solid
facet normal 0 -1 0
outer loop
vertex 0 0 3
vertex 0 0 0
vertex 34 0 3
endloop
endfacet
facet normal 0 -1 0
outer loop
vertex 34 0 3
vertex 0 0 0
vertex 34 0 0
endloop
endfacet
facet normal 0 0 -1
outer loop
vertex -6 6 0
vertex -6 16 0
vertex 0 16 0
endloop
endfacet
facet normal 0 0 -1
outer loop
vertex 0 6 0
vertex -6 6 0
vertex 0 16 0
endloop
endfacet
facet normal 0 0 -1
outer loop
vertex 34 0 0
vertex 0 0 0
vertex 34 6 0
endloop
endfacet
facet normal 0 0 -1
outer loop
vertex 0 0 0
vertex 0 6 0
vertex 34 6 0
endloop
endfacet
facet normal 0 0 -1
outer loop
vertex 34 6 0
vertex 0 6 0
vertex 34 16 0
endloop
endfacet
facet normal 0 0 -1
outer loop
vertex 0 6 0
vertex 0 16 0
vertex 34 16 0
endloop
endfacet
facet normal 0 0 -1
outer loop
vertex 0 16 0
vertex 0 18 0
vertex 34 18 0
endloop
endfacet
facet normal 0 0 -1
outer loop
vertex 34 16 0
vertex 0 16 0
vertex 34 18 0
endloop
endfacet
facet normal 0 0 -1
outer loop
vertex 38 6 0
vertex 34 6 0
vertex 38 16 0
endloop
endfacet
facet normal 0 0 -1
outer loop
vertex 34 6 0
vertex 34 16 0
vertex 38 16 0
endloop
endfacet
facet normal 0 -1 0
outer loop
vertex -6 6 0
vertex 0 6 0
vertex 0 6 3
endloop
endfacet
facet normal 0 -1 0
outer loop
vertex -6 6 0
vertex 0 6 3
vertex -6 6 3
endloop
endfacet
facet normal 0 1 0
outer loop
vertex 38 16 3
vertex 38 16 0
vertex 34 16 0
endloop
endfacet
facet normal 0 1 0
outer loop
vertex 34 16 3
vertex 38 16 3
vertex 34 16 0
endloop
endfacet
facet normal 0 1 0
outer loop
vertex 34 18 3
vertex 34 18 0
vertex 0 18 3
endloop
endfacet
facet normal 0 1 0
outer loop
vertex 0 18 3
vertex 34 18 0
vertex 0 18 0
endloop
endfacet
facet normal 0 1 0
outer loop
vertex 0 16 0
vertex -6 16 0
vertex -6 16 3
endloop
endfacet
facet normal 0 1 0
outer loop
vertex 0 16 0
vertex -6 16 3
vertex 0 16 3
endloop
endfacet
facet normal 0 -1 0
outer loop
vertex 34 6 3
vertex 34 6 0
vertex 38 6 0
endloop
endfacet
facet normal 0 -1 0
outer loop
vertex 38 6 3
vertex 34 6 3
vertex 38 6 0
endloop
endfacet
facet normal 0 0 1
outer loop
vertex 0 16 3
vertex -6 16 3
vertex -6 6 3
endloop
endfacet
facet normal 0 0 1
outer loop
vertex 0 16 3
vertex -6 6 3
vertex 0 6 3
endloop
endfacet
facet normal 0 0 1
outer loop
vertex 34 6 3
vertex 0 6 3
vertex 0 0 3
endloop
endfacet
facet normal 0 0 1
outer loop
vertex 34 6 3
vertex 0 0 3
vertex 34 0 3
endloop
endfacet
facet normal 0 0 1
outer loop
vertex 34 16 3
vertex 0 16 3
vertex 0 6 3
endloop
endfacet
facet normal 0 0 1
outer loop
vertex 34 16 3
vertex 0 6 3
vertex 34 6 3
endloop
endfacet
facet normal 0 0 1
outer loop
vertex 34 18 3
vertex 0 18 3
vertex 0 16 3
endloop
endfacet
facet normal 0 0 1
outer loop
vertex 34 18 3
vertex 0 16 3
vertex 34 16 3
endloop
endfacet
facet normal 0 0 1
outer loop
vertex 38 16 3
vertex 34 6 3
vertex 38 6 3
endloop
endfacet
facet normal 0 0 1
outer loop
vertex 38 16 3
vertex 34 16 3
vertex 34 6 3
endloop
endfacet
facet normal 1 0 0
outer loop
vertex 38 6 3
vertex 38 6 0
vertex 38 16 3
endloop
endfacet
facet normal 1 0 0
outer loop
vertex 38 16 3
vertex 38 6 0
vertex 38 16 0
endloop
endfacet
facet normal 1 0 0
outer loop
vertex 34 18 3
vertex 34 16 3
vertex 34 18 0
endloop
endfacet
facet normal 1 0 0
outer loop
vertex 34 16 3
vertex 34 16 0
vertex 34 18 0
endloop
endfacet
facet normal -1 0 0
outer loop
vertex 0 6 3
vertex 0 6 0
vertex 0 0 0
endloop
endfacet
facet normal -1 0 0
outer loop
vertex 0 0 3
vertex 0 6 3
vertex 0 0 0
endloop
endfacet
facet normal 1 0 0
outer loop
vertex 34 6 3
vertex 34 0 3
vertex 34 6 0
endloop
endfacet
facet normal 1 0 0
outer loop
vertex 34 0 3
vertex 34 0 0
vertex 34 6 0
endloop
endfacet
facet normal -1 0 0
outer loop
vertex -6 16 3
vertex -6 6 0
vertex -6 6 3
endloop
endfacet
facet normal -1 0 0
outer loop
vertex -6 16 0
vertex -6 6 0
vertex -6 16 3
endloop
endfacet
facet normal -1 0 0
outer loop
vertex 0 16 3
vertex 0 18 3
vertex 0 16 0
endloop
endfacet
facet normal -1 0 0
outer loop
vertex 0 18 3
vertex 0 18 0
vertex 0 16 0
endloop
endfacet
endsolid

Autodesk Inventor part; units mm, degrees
ref_plane "YZ Plane" through (0, 0, 0) normal (1, 0, 0) x (0, 1, 0)
ref_plane "XZ Plane" through (0, 0, 0) normal (0, 1, 0) x (-1, 0, 0)
ref_plane "XY Plane" through (0, 0, 0) normal (0, 0, 1) x (1, 0, 0)
sketch "Sketch1" plane through (0, 0, 0) normal (0, 0, 1) x (1, 0, 0)
  line L0 (0, 0) -> (34, 0)
  line L1 (34, 0) -> (34, 18)
  line L2 (34, 18) -> (0, 18)
  line L3 (0, 18) -> (0, 0)
  line L4 (-6, 16) -> (0, 16)
  line L5 (0, 16) -> (0, 6)
  line L6 (0, 6) -> (-6, 6)
  line L7 (-6, 6) -> (-6, 16)
  line L8 (-6, 16) -> (0, 6) construction
  line L9 (0, 16) -> (-6, 6) construction
  line L10 (38, 16) -> (34, 16)
  line L11 (34, 16) -> (34, 6)
  line L12 (34, 6) -> (38, 6)
  line L13 (38, 6) -> (38, 16)
  line L14 (38, 16) -> (34, 6) construction
  line L15 (34, 16) -> (38, 6) construction
  point P0 (-3, 11)
  point P1 (36, 11)
  point P2 (0, 16)
  dimension "d0" = 34
  dimension "d2" = 4
  dimension "d3" = 6
  dimension "d4" = 10
  dimension "d5" = 10
  dimension "d8" = 6
  dimension "d9" = 2
extrude "Extrusion1" add sketch "Sketch1" along normal blind 3
properties part number "Frontrail"
